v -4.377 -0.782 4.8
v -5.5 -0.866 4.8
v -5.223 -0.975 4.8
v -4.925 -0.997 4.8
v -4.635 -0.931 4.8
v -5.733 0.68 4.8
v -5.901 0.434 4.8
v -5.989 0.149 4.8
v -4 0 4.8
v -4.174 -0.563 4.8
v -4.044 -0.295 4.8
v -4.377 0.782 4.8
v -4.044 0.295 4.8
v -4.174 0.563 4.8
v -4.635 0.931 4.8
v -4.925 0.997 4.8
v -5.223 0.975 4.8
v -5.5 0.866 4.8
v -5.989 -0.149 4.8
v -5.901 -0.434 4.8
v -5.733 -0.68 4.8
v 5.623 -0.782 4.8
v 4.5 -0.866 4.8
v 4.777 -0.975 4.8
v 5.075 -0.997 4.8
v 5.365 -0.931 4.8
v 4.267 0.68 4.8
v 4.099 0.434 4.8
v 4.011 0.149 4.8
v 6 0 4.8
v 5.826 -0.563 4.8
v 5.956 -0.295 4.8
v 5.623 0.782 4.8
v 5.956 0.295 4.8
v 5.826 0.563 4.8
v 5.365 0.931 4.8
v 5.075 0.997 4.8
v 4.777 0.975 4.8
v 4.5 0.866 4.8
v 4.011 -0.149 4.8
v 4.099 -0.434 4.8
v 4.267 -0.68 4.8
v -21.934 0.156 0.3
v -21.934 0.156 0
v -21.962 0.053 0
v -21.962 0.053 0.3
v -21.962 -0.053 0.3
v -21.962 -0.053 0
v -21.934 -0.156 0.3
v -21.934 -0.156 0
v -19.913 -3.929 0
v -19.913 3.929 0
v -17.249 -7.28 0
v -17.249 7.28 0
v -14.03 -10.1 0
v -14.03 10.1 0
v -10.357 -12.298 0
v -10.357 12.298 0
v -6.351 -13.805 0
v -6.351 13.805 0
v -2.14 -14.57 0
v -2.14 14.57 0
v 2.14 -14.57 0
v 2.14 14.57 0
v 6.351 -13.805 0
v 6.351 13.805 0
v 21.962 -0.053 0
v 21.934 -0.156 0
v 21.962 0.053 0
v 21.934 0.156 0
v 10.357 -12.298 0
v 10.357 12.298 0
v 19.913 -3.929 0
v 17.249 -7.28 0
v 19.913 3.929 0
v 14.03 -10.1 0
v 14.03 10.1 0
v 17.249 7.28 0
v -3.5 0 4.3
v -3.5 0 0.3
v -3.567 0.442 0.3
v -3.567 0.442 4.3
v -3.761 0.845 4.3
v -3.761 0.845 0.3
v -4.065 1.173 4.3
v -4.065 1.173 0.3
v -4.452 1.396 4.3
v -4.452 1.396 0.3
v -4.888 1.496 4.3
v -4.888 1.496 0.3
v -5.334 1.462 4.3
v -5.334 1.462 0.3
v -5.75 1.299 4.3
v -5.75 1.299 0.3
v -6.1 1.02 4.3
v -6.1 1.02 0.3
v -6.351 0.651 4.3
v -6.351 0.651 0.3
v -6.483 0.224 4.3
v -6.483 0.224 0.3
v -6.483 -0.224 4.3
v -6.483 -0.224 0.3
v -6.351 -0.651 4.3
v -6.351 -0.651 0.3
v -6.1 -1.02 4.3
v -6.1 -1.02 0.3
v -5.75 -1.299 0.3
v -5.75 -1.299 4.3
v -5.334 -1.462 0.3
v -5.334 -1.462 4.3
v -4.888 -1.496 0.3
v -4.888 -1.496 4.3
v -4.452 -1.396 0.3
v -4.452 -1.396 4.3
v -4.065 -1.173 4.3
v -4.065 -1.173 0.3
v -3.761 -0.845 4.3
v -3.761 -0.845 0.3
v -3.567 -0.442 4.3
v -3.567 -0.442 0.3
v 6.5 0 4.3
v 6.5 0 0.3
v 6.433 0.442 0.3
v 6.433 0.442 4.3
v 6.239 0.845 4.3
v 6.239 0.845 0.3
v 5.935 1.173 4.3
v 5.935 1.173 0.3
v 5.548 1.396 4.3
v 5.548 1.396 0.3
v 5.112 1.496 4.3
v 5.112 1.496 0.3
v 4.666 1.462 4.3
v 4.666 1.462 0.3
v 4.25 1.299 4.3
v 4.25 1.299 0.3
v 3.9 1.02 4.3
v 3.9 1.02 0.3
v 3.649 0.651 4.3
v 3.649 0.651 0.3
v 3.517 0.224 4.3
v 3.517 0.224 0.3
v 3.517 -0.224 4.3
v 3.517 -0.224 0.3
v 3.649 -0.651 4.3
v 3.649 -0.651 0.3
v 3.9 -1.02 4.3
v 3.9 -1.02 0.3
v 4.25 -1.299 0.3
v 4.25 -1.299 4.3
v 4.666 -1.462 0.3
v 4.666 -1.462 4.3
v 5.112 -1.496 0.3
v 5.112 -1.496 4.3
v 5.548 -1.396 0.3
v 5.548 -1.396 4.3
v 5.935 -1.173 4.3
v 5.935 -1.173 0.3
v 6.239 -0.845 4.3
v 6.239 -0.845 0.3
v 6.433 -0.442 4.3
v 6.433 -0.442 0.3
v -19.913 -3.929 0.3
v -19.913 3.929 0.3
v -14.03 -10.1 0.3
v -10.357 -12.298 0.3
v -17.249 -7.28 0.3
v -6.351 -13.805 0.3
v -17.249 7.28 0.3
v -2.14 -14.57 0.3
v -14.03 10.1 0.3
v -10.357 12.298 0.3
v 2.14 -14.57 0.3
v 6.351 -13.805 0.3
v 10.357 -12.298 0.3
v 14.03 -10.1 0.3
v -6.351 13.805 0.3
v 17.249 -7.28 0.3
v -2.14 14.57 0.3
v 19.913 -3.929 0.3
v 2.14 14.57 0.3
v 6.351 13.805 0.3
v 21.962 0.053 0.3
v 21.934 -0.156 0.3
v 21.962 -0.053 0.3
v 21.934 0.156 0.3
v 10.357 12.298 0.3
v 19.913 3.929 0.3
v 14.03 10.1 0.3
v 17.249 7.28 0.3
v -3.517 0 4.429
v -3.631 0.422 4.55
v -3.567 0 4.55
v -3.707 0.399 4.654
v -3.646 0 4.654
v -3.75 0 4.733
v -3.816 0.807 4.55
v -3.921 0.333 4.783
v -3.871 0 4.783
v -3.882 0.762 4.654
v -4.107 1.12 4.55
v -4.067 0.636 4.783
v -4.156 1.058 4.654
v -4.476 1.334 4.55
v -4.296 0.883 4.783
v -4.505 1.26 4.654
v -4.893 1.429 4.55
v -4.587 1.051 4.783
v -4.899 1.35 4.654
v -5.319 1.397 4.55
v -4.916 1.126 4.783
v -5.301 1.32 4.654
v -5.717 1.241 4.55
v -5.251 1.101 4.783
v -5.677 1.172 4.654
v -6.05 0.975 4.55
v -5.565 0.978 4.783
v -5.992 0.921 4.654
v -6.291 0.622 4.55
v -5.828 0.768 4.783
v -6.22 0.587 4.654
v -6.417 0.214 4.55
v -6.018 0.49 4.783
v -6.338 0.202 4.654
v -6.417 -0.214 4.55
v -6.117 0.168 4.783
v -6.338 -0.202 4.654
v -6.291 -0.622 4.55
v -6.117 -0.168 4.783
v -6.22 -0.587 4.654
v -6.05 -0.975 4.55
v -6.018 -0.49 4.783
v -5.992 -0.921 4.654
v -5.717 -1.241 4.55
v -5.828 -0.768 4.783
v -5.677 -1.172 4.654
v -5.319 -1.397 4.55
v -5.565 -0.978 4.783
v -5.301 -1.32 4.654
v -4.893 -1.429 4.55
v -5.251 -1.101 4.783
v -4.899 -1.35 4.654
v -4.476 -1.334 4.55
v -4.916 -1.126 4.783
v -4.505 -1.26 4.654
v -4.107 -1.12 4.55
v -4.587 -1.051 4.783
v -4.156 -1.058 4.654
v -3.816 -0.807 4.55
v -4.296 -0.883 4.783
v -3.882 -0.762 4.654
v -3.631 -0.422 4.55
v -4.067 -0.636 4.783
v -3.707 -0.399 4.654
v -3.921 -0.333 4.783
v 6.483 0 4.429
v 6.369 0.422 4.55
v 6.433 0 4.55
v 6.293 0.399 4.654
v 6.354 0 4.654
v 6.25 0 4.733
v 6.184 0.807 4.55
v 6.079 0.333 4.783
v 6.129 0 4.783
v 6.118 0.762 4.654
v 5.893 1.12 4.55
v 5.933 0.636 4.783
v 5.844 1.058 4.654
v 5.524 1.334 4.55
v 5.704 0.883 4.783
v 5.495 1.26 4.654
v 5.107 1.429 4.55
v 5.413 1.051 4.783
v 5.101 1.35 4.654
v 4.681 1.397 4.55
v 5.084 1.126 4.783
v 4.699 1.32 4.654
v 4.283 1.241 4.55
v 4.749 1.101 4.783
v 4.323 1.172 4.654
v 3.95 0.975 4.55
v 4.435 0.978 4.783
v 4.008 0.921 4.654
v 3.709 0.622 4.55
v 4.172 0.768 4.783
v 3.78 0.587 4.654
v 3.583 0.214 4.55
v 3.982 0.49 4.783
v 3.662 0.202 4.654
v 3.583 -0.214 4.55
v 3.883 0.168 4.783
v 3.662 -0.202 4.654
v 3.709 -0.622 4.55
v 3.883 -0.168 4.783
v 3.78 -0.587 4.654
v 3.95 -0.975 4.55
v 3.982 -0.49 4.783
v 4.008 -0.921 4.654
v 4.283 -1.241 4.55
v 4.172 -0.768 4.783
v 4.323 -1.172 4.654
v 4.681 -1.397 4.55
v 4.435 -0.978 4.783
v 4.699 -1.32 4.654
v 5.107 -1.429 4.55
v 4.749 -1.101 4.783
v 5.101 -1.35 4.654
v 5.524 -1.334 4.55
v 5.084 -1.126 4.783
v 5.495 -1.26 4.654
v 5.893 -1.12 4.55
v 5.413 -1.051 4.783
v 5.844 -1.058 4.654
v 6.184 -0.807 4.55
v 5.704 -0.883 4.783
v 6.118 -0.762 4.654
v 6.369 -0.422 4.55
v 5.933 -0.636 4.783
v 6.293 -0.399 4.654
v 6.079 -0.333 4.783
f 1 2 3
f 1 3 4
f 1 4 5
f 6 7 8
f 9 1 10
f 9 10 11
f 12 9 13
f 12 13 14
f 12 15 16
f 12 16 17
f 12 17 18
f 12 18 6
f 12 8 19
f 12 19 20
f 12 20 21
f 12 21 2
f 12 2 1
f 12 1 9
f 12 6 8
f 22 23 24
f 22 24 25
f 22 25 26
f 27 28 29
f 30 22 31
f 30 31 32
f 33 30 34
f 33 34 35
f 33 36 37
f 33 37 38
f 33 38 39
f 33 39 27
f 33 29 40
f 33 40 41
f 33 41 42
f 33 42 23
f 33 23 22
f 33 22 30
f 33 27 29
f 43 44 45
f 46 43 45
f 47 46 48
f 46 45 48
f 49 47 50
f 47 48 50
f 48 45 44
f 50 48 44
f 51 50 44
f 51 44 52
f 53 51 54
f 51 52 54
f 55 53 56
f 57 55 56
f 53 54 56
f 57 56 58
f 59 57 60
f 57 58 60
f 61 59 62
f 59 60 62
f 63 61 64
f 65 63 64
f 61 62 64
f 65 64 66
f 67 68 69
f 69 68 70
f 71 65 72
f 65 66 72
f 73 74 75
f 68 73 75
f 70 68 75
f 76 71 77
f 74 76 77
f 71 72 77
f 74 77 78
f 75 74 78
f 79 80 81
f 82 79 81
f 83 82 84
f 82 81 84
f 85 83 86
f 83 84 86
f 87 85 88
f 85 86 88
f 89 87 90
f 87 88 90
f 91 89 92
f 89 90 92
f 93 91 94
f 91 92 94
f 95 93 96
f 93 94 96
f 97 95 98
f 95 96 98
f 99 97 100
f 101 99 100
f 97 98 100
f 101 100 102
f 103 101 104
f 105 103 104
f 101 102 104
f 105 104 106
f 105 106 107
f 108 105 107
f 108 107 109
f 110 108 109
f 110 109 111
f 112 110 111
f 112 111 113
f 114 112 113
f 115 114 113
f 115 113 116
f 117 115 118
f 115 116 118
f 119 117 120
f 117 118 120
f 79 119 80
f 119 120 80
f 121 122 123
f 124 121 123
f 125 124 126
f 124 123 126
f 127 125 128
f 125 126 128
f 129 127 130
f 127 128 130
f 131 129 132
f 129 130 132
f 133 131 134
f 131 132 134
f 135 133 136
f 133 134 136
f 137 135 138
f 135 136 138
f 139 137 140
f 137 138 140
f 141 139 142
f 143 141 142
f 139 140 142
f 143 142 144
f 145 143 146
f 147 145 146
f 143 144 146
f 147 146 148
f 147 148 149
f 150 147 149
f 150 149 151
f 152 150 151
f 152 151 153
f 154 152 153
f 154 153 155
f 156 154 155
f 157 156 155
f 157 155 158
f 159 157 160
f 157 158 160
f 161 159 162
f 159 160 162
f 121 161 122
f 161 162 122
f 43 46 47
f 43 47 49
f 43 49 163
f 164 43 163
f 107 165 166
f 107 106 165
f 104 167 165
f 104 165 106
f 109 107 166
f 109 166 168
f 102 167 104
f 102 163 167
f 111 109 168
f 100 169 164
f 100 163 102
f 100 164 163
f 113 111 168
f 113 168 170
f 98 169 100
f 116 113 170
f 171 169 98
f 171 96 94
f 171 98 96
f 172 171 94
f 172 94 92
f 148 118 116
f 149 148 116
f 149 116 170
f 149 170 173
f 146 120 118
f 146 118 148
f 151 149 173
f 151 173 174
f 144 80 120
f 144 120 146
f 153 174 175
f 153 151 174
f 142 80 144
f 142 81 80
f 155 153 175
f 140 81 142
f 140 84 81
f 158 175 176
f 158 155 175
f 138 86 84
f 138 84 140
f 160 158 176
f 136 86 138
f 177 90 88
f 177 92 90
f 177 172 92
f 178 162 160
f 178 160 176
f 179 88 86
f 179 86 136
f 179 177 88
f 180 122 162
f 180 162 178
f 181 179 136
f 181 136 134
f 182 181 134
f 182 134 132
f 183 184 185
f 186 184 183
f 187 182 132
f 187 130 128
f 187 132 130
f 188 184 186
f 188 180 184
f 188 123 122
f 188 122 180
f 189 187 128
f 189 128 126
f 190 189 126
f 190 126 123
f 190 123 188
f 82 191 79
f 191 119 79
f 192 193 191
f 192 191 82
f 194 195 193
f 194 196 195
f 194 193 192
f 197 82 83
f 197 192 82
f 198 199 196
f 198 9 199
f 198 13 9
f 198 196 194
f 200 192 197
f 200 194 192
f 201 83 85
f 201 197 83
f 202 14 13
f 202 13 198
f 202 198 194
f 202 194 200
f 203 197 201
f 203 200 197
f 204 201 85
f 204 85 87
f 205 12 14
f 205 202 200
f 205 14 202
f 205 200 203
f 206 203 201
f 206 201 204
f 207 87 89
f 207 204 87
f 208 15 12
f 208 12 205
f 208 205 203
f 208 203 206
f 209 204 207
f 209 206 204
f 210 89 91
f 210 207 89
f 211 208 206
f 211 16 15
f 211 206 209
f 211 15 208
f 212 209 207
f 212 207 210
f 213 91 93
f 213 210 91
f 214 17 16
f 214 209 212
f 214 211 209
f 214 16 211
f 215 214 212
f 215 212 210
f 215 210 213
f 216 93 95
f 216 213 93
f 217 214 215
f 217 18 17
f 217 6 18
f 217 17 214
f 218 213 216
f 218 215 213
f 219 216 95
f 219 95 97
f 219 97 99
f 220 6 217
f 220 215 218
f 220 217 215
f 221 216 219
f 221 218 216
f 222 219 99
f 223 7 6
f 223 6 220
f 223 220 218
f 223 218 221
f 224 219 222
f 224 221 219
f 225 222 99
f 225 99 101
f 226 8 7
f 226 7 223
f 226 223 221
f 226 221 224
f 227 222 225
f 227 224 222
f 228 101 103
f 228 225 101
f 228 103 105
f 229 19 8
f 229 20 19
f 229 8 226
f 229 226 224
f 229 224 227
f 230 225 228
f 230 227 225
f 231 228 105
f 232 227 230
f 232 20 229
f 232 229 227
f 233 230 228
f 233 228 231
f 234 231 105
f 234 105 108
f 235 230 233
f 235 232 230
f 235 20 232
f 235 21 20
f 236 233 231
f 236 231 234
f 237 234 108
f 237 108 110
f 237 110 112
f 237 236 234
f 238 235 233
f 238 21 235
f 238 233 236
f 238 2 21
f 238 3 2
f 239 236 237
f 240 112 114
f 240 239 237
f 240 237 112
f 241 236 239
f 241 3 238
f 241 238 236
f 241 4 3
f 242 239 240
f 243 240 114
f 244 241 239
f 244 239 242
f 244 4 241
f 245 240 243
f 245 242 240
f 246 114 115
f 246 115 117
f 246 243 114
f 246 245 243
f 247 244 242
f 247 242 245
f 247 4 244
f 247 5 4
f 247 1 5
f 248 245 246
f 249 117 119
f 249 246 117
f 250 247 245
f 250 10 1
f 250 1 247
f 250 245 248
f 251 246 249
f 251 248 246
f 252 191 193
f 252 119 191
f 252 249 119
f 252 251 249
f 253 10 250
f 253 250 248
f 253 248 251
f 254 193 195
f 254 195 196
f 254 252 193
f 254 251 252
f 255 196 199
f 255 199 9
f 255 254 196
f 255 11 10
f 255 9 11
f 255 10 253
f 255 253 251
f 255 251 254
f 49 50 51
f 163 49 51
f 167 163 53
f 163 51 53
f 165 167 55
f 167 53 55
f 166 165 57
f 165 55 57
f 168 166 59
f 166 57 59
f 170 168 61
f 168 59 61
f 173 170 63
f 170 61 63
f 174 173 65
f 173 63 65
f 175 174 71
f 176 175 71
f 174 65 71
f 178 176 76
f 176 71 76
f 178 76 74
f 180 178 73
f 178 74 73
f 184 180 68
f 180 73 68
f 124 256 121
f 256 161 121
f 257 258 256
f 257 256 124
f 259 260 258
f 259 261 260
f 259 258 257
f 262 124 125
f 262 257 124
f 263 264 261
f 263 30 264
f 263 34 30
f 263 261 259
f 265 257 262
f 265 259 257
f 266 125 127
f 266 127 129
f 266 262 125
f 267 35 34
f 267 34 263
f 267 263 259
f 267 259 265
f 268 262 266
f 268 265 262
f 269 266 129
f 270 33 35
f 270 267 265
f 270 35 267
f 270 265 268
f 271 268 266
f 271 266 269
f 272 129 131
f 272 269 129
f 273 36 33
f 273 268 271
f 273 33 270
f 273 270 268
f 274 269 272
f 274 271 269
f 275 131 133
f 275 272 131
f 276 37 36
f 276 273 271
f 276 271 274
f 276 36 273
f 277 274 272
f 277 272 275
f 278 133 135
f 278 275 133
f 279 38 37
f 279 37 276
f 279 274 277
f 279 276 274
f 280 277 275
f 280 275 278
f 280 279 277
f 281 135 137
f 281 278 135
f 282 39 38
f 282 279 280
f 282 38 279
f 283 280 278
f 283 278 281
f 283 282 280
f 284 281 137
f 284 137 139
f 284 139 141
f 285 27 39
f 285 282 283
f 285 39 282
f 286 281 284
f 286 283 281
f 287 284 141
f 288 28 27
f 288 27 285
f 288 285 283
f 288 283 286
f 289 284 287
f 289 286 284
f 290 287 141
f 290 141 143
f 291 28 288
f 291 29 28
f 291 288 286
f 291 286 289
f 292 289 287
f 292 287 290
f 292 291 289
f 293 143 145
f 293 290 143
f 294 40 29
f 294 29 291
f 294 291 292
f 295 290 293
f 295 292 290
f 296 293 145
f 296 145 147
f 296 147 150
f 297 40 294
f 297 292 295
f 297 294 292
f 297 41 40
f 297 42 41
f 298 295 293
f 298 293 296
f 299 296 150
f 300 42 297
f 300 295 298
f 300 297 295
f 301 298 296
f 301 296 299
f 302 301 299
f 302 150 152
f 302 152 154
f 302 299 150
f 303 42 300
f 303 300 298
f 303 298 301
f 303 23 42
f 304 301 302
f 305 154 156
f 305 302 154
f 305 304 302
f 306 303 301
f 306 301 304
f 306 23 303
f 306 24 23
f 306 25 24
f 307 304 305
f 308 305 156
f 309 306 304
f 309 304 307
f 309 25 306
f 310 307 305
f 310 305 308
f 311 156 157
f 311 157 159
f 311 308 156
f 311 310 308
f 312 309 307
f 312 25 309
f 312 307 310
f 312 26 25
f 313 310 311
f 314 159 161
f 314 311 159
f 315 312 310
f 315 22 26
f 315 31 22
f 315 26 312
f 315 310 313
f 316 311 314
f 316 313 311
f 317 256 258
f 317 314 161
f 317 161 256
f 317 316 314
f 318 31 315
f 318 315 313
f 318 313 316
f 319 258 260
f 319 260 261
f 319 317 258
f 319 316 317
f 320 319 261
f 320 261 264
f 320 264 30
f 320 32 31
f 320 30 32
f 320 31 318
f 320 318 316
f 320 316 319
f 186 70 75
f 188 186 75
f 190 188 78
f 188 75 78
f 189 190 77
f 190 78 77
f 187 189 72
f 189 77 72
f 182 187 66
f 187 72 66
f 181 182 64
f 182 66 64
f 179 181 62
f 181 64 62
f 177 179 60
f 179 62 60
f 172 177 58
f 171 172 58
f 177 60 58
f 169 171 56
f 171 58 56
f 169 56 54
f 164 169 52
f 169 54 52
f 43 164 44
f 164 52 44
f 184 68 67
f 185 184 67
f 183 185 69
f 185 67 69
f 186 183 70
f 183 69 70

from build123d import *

# Parameters (mm, degrees)
F3_DEPTH = 0.3
F4_R     = 1.5
F5_DEPTH = 4.5
F6_R     = 0.5


with BuildPart() as f3:
    # F2 (on Top) → F3 (new body)
    with BuildSketch(Plane.XY):
        with BuildLine():
            ThreePointArc((21.9341482237, -0.1564722617), (21.9660226591, 0), (21.9341482237, 0.1564722617))
            ThreePointArc((21.9341482237, 0.1564722617), (0, 14.6666666667), (-21.9341482237, 0.1564722617))
            ThreePointArc((-21.9341482237, 0.1564722617), (-21.9660226591, 0), (-21.9341482237, -0.1564722617))
            ThreePointArc((-21.9341482237, -0.1564722617), (0, -14.6666666667), (21.9341482237, -0.1564722617))
        make_face()
    extrude(amount=F3_DEPTH)

    # F4 (on face) → F5 (join)
    with BuildSketch(Plane.XY.offset(0.3)):
        with Locations((-5, 0)):
            Circle(F4_R)
        with Locations((5, 0)):
            Circle(F4_R)
    extrude(amount=F5_DEPTH)

    # F6
    f6_edges = [f3.edges().sort_by_distance(p)[0] for p in [
        (-6.5, 0, 4.8),
        (3.5, 0, 4.8),
    ]]
    fillet(f6_edges, radius=F6_R)


solid = f3.part
